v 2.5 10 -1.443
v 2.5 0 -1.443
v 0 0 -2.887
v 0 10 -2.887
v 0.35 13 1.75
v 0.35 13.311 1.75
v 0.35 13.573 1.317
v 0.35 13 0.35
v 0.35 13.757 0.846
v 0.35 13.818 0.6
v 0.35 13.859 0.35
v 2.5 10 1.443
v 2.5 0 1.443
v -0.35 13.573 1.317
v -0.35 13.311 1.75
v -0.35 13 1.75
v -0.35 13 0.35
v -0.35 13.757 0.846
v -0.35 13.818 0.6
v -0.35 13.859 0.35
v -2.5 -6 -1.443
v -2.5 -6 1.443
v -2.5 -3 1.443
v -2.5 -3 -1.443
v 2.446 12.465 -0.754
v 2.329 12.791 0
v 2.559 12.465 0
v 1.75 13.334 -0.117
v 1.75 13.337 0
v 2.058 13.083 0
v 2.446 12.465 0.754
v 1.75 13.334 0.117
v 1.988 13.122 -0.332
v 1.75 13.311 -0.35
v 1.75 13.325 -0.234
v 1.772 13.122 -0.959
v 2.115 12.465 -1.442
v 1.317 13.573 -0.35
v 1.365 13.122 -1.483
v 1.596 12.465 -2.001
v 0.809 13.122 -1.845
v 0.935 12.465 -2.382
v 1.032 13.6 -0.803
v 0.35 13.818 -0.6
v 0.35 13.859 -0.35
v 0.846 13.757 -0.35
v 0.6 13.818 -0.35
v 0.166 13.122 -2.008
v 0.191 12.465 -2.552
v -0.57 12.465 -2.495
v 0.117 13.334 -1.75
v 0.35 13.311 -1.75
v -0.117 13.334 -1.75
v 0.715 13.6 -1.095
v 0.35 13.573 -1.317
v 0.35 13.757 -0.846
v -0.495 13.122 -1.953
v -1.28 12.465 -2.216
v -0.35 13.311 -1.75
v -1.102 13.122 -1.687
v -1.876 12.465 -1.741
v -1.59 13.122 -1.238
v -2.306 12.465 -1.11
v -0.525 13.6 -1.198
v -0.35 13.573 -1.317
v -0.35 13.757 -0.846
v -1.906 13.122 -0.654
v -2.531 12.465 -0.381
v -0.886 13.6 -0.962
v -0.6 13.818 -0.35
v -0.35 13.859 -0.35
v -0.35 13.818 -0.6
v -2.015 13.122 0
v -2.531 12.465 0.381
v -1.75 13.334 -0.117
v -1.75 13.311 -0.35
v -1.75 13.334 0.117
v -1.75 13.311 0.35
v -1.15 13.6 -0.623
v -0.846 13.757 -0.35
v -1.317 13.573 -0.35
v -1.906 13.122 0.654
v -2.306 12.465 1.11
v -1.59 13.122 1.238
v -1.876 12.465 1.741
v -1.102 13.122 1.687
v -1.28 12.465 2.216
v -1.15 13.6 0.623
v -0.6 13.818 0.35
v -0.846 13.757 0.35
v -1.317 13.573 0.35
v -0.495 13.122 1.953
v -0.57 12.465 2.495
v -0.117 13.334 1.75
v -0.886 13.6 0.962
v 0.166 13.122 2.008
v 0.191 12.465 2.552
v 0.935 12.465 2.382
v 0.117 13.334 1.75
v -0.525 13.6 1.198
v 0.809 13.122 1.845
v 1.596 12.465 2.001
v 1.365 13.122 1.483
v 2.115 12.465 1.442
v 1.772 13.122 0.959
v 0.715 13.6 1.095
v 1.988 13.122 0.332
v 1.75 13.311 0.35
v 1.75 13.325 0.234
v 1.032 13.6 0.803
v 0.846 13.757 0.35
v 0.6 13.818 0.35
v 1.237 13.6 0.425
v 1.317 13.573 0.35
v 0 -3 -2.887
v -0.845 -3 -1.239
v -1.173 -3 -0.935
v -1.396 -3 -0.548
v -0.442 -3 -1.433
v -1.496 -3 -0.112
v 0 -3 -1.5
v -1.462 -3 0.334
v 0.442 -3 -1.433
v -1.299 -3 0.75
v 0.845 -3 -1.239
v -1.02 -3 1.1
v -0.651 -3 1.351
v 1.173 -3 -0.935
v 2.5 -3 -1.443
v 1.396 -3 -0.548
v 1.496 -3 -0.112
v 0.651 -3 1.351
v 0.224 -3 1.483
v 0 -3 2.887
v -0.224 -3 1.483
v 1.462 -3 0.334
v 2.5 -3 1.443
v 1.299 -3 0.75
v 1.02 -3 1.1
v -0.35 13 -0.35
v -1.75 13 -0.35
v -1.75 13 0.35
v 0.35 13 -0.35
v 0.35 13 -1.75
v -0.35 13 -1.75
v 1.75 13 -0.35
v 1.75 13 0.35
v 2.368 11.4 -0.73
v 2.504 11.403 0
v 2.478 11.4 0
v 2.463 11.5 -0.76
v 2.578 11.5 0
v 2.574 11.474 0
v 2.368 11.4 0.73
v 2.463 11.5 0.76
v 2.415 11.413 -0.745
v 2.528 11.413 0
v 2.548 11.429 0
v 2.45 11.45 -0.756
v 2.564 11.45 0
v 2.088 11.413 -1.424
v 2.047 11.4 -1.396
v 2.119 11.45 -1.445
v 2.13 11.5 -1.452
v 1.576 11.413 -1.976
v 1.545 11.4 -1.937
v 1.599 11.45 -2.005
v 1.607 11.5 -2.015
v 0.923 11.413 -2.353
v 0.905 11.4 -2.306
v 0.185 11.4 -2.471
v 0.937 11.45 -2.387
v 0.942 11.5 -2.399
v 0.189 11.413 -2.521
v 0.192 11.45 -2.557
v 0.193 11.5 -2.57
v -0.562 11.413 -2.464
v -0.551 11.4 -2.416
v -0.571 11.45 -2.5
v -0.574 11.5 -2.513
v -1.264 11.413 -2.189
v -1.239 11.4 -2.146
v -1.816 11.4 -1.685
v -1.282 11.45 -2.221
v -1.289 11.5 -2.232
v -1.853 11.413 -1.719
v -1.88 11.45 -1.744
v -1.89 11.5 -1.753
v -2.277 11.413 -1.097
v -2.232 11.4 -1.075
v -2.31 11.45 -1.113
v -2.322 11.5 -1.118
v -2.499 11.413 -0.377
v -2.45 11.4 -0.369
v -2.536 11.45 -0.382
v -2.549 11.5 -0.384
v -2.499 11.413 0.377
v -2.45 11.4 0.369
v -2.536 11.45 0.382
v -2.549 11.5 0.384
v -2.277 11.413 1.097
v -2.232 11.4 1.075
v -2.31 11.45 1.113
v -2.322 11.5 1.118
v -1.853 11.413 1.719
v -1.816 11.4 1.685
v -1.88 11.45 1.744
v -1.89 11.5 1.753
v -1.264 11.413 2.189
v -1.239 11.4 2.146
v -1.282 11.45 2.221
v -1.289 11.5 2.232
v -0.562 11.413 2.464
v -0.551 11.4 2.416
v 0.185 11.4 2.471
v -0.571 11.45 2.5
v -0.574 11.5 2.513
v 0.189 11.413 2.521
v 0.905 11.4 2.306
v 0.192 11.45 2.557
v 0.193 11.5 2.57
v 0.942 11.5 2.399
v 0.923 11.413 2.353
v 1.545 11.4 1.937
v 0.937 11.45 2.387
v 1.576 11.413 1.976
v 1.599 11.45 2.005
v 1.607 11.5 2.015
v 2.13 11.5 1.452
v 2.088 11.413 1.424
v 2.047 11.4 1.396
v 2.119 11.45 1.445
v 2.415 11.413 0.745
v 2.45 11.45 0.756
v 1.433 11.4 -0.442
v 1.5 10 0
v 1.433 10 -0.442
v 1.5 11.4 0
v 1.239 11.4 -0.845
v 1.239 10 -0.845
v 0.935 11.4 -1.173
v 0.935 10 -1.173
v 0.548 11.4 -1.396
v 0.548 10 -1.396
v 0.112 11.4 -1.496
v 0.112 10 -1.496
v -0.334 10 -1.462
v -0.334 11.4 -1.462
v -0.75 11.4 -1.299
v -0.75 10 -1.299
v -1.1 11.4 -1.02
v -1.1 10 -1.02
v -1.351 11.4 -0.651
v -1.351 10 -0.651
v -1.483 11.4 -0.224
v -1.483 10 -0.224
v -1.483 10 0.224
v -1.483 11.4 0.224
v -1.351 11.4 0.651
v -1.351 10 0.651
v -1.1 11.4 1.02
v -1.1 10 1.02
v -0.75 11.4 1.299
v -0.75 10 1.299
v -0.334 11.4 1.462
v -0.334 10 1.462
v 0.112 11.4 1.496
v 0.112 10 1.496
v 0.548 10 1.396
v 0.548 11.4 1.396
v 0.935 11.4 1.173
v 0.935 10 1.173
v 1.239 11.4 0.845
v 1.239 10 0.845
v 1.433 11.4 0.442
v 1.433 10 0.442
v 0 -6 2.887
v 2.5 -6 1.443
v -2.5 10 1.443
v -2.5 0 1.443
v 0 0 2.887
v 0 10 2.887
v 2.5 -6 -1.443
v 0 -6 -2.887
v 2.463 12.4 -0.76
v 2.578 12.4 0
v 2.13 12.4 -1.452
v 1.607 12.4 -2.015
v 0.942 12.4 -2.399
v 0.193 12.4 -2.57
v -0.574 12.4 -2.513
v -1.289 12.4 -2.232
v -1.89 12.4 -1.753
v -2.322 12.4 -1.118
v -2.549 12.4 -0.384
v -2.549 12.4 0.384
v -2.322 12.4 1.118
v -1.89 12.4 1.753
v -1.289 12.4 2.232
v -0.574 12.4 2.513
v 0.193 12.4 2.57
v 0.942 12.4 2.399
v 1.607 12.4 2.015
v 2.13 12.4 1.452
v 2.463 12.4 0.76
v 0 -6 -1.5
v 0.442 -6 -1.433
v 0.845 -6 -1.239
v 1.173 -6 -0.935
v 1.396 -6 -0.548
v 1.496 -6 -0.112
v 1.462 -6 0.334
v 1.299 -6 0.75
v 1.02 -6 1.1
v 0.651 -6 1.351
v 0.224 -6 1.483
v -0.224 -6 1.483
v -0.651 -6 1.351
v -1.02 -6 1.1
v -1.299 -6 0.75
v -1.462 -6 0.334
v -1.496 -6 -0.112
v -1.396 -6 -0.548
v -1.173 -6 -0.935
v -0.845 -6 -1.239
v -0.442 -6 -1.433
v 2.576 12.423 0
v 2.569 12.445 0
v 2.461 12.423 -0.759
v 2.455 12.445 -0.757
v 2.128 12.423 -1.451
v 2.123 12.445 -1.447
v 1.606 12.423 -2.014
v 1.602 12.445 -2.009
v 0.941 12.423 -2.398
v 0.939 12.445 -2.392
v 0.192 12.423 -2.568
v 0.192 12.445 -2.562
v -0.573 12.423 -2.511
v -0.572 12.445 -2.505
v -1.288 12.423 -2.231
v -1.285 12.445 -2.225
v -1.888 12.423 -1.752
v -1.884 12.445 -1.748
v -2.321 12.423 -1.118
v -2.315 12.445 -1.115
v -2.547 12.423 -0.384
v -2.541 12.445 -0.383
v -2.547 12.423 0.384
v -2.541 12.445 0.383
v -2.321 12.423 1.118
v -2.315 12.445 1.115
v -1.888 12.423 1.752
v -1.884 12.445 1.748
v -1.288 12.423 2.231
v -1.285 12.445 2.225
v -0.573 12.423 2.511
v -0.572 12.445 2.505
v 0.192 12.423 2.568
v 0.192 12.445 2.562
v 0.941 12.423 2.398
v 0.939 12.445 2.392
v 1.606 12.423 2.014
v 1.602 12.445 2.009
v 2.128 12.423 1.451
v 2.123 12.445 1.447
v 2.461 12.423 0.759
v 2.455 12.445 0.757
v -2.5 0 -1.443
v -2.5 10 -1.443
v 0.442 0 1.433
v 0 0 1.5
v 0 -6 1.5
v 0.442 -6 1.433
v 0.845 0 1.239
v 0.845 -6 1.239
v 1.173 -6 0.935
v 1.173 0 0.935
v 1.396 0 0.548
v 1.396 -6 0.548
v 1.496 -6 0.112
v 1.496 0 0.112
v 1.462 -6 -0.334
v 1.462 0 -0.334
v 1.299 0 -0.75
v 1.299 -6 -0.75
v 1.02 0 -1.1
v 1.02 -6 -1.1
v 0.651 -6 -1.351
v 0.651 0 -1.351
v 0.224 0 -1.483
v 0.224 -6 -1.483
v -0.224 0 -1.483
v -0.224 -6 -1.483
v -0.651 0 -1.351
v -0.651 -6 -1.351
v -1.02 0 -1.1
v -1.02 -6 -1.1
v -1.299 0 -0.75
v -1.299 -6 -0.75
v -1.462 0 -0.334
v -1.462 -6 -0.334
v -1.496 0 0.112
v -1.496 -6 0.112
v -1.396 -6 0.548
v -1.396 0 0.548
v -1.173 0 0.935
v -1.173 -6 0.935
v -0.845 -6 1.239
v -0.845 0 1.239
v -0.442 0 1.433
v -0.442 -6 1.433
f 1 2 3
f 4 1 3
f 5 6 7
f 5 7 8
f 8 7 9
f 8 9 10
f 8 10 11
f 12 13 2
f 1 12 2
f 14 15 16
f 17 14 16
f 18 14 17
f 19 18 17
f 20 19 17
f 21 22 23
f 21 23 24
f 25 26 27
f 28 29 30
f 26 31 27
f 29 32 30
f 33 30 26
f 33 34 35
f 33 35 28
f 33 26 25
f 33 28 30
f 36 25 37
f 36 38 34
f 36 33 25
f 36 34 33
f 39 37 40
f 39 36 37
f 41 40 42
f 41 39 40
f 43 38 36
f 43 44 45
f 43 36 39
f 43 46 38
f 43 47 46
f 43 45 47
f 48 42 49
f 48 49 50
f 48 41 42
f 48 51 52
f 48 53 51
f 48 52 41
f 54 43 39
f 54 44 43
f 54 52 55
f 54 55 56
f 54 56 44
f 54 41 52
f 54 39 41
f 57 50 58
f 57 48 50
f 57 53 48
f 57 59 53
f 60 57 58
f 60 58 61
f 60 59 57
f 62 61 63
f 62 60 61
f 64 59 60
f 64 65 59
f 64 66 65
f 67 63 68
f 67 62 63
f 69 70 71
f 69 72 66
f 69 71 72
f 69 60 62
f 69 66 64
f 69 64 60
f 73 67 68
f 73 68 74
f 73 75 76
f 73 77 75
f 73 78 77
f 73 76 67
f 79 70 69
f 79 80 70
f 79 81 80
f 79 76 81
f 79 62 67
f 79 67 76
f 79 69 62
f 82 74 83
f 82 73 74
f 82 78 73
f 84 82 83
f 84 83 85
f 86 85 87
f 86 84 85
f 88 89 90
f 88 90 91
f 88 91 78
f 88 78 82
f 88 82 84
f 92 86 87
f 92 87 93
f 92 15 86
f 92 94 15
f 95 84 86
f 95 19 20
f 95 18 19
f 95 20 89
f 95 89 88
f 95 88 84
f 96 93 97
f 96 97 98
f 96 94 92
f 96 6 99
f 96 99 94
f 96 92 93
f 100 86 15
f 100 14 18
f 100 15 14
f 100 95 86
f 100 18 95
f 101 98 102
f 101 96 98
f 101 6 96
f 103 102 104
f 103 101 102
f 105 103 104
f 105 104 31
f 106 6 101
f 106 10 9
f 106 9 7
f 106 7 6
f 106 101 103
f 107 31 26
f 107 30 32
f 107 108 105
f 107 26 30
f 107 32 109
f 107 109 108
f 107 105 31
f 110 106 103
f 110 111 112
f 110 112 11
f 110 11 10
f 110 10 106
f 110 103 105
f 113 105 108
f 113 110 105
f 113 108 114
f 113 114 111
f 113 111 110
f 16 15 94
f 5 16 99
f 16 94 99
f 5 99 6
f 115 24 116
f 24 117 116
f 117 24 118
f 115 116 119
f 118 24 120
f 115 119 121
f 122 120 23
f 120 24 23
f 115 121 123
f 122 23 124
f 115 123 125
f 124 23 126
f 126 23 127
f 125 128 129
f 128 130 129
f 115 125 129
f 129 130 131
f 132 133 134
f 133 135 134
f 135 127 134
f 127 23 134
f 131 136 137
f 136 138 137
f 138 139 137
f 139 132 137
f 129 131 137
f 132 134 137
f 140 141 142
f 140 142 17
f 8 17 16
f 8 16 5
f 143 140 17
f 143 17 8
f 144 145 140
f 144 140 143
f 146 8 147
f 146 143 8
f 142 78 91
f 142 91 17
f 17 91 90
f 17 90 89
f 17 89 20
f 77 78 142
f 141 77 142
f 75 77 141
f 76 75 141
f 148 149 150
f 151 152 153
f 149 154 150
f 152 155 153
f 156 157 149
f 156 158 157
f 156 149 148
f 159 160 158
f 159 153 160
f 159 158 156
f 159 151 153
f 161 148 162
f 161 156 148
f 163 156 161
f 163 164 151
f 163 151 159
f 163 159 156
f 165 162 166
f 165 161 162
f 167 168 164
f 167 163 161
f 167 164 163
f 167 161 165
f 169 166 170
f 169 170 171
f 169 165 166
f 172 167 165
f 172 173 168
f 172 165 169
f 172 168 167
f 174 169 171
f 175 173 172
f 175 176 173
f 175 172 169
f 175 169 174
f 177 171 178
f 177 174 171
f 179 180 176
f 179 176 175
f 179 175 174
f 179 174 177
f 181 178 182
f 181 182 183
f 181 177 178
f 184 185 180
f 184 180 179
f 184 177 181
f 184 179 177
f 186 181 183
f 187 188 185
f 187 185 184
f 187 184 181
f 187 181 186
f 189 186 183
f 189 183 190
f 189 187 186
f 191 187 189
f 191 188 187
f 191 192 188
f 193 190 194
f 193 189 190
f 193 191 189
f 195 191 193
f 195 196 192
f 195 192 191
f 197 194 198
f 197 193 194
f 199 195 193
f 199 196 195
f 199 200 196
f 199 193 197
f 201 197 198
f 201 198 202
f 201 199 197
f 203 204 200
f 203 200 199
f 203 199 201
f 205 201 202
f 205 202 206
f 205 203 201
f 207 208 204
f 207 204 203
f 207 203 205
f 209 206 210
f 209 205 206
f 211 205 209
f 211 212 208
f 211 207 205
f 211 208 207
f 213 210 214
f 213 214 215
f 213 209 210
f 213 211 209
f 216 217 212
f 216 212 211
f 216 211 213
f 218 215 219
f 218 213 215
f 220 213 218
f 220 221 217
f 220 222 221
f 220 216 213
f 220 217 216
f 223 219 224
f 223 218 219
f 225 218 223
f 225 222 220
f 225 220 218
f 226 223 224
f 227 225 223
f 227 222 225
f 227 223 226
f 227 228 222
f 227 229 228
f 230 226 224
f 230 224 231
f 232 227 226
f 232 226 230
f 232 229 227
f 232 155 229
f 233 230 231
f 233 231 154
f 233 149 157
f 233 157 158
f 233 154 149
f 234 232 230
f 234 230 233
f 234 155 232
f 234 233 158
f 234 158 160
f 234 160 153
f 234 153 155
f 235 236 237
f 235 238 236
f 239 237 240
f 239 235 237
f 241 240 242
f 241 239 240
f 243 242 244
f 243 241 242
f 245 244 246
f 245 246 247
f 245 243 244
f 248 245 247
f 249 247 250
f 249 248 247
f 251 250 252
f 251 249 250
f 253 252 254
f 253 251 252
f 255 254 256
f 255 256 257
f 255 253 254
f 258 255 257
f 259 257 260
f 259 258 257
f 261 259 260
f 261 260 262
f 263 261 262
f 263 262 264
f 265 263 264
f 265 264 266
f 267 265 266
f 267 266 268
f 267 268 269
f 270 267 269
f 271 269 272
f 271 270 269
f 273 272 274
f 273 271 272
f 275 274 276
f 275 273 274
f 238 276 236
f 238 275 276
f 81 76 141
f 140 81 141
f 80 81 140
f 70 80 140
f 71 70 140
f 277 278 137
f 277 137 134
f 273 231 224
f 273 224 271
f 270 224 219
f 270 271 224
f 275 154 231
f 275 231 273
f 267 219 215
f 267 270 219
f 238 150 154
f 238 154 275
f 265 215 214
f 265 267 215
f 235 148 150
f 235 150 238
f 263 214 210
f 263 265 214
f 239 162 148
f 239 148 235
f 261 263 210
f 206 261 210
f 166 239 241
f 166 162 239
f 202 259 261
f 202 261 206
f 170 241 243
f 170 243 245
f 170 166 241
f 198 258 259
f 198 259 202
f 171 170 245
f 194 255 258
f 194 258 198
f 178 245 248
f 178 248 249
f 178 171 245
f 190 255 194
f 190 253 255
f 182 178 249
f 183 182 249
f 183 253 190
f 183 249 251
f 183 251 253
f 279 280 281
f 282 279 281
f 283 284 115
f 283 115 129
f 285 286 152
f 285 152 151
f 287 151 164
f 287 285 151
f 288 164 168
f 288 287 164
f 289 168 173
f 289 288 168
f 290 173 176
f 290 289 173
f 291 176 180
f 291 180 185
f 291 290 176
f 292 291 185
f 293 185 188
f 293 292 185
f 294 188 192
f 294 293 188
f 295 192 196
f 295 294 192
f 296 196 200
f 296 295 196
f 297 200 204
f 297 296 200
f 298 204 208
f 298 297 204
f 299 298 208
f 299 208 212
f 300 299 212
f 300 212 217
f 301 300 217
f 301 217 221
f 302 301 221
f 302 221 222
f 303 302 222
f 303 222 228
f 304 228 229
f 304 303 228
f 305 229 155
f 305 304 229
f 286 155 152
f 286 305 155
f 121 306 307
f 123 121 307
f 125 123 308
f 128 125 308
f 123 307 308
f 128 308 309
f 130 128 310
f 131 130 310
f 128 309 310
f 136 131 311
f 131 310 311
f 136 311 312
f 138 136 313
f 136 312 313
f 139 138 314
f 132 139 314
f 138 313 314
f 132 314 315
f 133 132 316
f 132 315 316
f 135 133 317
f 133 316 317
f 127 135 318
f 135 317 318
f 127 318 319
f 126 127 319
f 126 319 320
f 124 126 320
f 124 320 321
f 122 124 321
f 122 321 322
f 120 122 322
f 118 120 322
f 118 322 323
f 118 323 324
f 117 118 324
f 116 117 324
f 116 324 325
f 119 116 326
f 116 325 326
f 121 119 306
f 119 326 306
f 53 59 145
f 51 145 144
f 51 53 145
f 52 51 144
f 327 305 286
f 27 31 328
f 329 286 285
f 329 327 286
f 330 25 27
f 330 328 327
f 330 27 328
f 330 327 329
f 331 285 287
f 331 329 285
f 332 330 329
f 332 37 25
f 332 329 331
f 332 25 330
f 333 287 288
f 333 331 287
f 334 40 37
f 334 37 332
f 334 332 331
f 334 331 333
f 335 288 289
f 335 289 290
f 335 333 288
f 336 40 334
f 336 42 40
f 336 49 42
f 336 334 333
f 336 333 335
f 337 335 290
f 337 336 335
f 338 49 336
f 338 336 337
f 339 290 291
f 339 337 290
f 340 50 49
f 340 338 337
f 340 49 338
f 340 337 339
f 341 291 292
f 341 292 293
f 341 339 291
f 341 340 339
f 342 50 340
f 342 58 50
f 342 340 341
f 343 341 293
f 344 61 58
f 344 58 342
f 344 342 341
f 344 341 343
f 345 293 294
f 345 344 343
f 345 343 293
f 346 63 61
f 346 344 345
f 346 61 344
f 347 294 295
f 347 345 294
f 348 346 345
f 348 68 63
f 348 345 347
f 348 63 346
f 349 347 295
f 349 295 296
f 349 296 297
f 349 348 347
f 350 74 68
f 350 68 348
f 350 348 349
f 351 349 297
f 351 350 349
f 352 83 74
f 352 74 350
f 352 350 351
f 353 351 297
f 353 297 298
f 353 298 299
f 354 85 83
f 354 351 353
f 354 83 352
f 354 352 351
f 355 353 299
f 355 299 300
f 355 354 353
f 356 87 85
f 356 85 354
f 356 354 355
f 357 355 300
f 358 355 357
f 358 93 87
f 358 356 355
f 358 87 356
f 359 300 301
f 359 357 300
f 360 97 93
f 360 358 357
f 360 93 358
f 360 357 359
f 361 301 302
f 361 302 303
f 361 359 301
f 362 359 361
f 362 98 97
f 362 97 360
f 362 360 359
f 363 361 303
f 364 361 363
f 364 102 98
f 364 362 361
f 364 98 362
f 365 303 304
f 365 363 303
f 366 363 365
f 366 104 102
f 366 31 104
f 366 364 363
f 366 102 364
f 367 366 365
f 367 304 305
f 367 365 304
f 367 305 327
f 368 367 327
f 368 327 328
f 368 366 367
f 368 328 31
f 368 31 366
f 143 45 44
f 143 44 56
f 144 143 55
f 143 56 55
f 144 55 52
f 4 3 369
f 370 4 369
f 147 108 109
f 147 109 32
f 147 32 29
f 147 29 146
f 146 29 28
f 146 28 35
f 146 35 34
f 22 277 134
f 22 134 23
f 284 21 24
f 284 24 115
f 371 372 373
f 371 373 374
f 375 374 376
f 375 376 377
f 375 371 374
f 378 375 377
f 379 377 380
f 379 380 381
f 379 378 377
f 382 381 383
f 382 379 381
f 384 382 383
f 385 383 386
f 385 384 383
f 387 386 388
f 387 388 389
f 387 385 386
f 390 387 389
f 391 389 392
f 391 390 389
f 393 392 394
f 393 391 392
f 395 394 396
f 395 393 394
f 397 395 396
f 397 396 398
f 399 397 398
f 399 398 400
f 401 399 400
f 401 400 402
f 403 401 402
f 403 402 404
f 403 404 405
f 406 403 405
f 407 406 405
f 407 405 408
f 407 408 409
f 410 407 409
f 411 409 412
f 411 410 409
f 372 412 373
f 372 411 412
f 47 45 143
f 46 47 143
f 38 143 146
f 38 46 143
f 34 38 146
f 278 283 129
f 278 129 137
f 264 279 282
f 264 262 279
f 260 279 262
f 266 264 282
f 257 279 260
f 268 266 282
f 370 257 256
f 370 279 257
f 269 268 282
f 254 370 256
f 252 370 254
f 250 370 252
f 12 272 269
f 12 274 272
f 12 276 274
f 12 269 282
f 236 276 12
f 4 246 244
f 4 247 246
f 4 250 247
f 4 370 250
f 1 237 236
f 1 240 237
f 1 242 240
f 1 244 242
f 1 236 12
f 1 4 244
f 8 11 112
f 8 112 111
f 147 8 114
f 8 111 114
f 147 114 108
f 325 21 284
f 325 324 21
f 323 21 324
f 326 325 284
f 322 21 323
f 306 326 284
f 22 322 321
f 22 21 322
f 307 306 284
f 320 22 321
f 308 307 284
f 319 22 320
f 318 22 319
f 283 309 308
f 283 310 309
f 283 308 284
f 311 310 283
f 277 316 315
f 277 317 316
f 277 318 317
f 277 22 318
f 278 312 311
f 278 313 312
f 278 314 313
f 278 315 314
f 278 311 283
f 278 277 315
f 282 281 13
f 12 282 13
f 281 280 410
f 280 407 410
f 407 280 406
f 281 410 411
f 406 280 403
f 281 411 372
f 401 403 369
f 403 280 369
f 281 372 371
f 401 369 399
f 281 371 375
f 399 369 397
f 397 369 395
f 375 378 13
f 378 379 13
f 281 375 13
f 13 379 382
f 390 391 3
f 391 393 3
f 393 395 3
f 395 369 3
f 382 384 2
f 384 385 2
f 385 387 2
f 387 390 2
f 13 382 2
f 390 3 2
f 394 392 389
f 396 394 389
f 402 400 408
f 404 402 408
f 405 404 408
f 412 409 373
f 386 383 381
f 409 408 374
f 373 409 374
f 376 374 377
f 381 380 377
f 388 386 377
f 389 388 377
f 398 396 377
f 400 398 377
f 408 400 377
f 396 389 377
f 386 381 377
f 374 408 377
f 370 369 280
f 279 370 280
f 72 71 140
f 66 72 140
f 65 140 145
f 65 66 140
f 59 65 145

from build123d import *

# Parameters (mm, degrees)
BOSS_EXTRUDE1_DEPTH = 10
SKETCH1_4_R         = 1.5
BOSS_EXTRUDE2_DEPTH = 6
CUT_EXTRUDE1_DEPTH  = 7
FILLET1_R           = 0.1
SKETCH5_R           = 1.5
BOSS_EXTRUDE3_DEPTH = 3


with BuildPart() as part:
    # Sketch1 → Boss-Extrude1 (new body)
    with BuildSketch(Plane(origin=(0, 0, 0), x_dir=(1, 0, 0), z_dir=(0, 1, 0))):
        Polygon((2.5, -1.443375673), (2.5, 1.443375673), (0, 2.886751346), (-2.5, 1.443375673), (-2.5, -1.443375673), (0, -2.886751346), align=None)
    extrude(amount=BOSS_EXTRUDE1_DEPTH)

    # Sketch1<4> → Boss-Extrude2 (add)
    with BuildSketch(Plane(origin=(0, 0, 0), x_dir=(1, 0, 0), z_dir=(0, 1, 0))):
        Circle(SKETCH1_4_R)
    extrude(amount=-BOSS_EXTRUDE2_DEPTH)

    # Sketch3 → Revolve1 (revolve)
    with BuildSketch(Plane.XY):
        with BuildLine():
            Line((0, 10), (1.5, 10))
            Line((1.5, 10), (1.5, 11.4))
            Line((1.5, 11.4), (2.577677109, 11.4))
            Line((2.577677109, 11.4), (2.577677109, 12.4))
            ThreePointArc((2.577677109, 12.4), (2.572999108, 12.43387649), (2.559315243, 12.465217392))
            ThreePointArc((2.559315243, 12.465217392), (1.46702894, 13.516835128), (0, 13.9))
            Line((0, 13.9), (0, 10))
        make_face()
    revolve(axis=Axis((0, 10, 0), (0, -1, 0)))

    # Sketch4 → Cut-Extrude1 (cut)
    with BuildSketch(Plane(origin=(0, 20, 0), x_dir=(1, 0, 0), z_dir=(0, 1, 0))):
        Polygon((-1.75, 0.35), (-1.75, -0.35), (-0.35, -0.35), (-0.35, -1.75), (0.35, -1.75), (0.35, -0.35), (1.75, -0.35), (1.75, 0.35), (0.35, 0.35), (0.35, 1.75), (-0.35, 1.75), (-0.35, 0.35), align=None)
    extrude(amount=-CUT_EXTRUDE1_DEPTH, mode=Mode.SUBTRACT)

    # Fillet1
    fillet1_edges = [part.edges().sort_by_distance(p)[0] for p in [
        (-2.577677109, 11.4, 0),
    ]]
    fillet(fillet1_edges, radius=FILLET1_R)


with BuildPart() as body_2:
    # Sketch5 → Boss-Extrude3 (new body)
    with BuildSketch(Plane.XZ.offset(6)):
        Polygon((2.5, 1.443375673), (0, 2.886751346), (-2.5, 1.443375673), (-2.5, -1.443375673), (0, -2.886751346), (2.5, -1.443375673), align=None)
        Circle(SKETCH5_R, mode=Mode.SUBTRACT)
    extrude(amount=-BOSS_EXTRUDE3_DEPTH)


solid = Compound([part.part, body_2.part])
